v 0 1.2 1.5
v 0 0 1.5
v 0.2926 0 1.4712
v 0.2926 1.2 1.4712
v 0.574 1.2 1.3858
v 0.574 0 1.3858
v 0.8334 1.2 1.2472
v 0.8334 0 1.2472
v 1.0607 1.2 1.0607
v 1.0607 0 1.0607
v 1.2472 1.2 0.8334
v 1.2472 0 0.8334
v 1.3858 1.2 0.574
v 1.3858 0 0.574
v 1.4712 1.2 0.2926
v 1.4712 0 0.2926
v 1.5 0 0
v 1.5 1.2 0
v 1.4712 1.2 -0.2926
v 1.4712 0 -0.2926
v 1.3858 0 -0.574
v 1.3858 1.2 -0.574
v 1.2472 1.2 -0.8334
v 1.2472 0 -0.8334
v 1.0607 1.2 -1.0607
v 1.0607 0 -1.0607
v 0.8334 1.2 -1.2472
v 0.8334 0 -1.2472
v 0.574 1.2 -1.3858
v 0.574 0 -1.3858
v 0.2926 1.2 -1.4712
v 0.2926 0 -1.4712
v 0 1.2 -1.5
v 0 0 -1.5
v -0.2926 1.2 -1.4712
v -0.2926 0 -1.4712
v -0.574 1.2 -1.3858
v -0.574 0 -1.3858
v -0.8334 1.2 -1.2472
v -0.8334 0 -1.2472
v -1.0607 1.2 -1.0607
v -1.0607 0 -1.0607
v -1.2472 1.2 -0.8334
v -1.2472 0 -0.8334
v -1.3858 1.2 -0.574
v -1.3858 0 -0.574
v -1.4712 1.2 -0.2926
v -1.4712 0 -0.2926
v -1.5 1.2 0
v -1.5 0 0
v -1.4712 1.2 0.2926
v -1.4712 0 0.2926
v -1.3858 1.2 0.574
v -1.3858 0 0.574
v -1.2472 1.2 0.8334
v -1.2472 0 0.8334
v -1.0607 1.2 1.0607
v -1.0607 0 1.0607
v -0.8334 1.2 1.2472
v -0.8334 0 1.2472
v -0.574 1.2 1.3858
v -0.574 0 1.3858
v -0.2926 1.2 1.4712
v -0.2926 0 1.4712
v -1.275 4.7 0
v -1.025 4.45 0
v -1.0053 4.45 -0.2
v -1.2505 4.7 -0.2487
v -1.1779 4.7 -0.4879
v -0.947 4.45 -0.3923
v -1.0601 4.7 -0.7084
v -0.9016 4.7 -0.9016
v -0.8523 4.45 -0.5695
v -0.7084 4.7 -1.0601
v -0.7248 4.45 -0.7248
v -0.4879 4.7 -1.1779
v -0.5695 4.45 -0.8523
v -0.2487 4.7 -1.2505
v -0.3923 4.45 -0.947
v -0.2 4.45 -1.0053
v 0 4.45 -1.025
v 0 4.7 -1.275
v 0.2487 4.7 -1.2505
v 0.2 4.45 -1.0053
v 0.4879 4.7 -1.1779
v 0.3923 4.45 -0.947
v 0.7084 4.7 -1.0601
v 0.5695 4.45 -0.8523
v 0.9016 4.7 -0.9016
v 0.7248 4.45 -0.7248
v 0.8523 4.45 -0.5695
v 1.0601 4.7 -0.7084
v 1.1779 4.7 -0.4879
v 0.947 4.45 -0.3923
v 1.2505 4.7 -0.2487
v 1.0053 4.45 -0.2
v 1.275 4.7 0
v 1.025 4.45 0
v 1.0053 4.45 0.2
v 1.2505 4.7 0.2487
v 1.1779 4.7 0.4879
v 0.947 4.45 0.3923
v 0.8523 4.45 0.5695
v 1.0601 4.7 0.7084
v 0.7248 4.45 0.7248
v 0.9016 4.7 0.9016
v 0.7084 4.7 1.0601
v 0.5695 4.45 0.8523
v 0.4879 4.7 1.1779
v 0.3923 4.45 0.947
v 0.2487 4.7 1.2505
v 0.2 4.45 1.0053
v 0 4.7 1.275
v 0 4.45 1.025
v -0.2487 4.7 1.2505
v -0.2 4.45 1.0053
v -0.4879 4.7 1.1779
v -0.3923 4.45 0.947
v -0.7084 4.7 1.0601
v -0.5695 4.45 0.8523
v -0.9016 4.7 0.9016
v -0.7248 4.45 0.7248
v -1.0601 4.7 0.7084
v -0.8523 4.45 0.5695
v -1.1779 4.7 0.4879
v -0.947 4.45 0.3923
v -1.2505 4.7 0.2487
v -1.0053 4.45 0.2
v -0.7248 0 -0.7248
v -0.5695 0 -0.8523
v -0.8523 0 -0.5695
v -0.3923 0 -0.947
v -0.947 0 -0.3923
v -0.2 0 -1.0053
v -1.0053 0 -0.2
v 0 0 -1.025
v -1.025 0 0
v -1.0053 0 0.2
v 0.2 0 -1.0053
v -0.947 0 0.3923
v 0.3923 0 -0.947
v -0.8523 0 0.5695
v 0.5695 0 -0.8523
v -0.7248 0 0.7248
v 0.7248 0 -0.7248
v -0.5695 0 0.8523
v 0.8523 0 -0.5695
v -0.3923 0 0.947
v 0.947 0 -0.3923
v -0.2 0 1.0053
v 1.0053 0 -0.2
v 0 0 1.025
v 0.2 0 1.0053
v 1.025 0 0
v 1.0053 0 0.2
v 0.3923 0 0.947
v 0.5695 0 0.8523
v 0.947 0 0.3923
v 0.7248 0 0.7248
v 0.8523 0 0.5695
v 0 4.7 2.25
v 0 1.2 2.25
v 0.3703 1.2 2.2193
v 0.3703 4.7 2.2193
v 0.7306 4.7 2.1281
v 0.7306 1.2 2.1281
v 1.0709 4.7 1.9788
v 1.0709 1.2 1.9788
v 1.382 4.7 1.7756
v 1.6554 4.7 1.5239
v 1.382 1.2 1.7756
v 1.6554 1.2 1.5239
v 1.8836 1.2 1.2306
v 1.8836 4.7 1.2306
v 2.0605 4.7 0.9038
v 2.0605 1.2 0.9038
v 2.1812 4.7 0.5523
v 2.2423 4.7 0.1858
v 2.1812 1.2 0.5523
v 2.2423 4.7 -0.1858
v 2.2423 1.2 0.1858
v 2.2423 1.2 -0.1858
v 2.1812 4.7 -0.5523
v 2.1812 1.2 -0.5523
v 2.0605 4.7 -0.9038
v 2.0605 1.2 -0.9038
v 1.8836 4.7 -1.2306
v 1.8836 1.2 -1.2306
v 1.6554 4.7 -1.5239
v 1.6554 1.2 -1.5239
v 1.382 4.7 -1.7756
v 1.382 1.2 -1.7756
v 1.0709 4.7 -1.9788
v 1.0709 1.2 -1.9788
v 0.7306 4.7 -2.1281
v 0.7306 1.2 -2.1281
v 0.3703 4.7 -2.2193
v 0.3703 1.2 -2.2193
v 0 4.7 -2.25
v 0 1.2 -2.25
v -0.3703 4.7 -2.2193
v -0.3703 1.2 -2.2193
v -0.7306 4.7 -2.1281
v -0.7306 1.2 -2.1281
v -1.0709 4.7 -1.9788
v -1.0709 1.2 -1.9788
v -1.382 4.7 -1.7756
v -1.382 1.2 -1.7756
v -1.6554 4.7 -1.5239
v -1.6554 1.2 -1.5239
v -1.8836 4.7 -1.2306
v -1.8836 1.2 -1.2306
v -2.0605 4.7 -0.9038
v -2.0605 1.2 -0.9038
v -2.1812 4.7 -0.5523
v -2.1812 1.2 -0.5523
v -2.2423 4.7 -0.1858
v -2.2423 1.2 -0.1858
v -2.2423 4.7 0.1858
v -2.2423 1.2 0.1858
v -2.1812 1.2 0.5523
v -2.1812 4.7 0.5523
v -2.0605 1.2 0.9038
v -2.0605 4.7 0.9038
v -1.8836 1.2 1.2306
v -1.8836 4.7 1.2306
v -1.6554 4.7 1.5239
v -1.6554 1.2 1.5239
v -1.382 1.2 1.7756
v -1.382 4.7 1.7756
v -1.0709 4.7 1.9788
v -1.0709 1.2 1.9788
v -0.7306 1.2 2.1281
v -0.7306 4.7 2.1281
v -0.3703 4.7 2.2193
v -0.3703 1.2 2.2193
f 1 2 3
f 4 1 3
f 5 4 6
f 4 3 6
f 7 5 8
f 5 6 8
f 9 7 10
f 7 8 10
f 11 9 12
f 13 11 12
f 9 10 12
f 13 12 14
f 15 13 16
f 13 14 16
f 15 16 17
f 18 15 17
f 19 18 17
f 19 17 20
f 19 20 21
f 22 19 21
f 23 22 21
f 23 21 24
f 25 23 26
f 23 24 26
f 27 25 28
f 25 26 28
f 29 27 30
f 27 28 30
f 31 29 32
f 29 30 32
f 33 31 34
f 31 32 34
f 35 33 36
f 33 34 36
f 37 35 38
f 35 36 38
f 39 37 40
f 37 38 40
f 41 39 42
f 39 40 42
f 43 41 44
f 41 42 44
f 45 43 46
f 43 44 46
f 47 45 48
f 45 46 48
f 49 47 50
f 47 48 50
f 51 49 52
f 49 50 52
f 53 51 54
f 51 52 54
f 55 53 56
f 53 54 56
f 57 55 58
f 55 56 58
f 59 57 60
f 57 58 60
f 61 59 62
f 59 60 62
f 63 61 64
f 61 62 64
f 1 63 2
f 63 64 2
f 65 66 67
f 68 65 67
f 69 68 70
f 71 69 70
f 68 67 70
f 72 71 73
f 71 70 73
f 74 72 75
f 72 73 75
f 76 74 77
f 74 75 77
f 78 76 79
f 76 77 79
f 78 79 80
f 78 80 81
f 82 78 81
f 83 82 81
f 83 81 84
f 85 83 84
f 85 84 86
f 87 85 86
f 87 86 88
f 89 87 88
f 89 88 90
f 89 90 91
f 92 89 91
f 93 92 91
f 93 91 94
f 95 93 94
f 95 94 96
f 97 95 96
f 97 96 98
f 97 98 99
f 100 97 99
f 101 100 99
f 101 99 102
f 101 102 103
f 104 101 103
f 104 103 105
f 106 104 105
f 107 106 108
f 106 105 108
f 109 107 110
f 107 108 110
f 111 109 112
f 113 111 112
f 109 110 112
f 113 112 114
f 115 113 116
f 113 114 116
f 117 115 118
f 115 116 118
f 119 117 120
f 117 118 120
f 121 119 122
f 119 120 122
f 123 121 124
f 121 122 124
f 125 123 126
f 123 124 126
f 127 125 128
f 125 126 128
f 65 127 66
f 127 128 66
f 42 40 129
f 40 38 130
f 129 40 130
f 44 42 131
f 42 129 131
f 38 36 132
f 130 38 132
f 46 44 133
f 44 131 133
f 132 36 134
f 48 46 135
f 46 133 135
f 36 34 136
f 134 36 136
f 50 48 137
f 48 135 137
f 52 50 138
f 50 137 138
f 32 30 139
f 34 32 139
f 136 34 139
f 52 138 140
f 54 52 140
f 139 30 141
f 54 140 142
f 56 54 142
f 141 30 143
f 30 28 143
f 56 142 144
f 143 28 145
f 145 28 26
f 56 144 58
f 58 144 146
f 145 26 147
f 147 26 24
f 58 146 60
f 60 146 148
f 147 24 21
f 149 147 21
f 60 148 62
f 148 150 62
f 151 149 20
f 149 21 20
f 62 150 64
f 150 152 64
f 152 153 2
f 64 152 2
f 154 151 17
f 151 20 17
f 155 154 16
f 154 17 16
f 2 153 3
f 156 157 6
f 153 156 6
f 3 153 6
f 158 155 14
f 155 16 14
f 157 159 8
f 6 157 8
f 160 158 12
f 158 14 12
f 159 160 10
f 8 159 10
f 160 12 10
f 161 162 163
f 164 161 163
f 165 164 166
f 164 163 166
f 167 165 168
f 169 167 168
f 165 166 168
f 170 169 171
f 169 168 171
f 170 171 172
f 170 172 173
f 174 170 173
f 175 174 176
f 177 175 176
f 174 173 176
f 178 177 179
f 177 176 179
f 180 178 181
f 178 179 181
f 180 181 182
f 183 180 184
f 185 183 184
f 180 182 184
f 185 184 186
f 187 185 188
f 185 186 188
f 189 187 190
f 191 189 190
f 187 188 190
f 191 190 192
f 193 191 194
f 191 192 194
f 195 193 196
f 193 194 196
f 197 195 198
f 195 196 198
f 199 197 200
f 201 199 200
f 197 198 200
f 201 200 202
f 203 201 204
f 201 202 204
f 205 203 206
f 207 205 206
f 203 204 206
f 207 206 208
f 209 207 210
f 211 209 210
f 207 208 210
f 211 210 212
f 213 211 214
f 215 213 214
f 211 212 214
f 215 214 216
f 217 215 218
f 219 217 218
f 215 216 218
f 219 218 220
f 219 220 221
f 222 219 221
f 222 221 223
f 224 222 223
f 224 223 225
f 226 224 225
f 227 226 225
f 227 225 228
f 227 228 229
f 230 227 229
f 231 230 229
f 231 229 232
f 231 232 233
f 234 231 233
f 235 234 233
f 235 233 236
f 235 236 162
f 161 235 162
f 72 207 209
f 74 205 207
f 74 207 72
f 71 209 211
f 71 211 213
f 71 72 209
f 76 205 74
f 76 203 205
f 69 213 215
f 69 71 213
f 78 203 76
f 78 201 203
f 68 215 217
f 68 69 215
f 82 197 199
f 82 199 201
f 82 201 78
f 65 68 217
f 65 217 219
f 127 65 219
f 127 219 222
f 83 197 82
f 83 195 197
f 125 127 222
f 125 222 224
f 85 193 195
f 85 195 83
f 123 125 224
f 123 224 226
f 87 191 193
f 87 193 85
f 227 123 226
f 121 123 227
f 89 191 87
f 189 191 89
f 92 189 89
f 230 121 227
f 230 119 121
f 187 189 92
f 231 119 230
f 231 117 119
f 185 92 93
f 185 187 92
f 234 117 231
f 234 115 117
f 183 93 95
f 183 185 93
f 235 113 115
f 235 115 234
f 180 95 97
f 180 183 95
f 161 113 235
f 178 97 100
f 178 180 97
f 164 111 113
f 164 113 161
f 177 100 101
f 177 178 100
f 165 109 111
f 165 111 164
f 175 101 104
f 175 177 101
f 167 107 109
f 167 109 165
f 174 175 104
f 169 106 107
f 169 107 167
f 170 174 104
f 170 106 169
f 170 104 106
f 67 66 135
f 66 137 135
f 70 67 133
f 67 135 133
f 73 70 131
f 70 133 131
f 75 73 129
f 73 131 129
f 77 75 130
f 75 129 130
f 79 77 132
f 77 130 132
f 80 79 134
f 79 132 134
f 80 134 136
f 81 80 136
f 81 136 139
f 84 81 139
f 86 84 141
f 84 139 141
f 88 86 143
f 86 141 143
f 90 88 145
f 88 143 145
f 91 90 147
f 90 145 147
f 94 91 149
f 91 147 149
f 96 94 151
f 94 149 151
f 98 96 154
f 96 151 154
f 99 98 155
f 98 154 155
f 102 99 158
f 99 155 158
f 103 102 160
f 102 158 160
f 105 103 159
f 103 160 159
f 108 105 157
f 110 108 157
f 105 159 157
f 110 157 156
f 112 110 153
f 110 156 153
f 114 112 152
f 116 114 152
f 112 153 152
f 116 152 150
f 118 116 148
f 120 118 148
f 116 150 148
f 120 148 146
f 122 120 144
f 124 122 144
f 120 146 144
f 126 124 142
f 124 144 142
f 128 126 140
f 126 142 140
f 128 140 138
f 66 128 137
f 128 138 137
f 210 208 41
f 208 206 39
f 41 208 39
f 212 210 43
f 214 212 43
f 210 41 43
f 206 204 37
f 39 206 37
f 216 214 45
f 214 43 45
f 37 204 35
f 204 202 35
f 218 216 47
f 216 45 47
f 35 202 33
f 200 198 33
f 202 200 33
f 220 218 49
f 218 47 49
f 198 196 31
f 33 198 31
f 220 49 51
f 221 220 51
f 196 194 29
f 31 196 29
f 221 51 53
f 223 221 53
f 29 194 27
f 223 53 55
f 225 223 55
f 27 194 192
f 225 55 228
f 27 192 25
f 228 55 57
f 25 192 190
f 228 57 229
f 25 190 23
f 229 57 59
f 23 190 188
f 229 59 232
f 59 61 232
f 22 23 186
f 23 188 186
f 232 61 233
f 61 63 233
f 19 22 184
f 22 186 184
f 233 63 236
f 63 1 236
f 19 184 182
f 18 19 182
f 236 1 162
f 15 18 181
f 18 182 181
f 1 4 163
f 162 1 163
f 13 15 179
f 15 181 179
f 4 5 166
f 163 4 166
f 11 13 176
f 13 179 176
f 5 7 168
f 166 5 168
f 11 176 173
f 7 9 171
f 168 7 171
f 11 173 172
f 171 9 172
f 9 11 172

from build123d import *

# Parameters (mm, degrees)
SKETCH_1_R                     = 1.5
EXTRUDE_1_DEPTH                = 1.2
SKETCH_2_R                     = 2.25
EXTRUDE_2_DEPTH                = 3.5
HOLE_WIZARD_M2_5_1_D           = 2.05
HOLE_WIZARD_M2_5_1_CSINK_D     = 2.55
HOLE_WIZARD_M2_5_1_CSINK_ANGLE = 90


with BuildPart() as part:
    # 草图1 → 凸台-拉伸1 (new body)
    with BuildSketch(Plane(origin=(0, 0, 0), x_dir=(1, 0, 0), z_dir=(0, 1, 0))):
        with Locations(Location((0, 0, 0), (0, 0, 270))):
            Circle(SKETCH_1_R)
    extrude(amount=EXTRUDE_1_DEPTH)

    # 草图2 → 凸台-拉伸2 (add)
    with BuildSketch(Plane(origin=(0, 1.2, 0), x_dir=(1, 0, 0), z_dir=(0, 1, 0))):
        with Locations(Location((0, 0, 0), (0, 0, 270))):
            Circle(SKETCH_2_R)
    extrude(amount=EXTRUDE_2_DEPTH)

    # M2.5 螺纹孔1 (through all)
    with Locations(Plane(origin=(0, 4.7, 0), x_dir=(1, 0, 0), z_dir=(0, 1, 0))):
        with Locations((0, 0)):
            CounterSinkHole(HOLE_WIZARD_M2_5_1_D / 2, HOLE_WIZARD_M2_5_1_CSINK_D / 2, counter_sink_angle=HOLE_WIZARD_M2_5_1_CSINK_ANGLE)


solid = part.part
